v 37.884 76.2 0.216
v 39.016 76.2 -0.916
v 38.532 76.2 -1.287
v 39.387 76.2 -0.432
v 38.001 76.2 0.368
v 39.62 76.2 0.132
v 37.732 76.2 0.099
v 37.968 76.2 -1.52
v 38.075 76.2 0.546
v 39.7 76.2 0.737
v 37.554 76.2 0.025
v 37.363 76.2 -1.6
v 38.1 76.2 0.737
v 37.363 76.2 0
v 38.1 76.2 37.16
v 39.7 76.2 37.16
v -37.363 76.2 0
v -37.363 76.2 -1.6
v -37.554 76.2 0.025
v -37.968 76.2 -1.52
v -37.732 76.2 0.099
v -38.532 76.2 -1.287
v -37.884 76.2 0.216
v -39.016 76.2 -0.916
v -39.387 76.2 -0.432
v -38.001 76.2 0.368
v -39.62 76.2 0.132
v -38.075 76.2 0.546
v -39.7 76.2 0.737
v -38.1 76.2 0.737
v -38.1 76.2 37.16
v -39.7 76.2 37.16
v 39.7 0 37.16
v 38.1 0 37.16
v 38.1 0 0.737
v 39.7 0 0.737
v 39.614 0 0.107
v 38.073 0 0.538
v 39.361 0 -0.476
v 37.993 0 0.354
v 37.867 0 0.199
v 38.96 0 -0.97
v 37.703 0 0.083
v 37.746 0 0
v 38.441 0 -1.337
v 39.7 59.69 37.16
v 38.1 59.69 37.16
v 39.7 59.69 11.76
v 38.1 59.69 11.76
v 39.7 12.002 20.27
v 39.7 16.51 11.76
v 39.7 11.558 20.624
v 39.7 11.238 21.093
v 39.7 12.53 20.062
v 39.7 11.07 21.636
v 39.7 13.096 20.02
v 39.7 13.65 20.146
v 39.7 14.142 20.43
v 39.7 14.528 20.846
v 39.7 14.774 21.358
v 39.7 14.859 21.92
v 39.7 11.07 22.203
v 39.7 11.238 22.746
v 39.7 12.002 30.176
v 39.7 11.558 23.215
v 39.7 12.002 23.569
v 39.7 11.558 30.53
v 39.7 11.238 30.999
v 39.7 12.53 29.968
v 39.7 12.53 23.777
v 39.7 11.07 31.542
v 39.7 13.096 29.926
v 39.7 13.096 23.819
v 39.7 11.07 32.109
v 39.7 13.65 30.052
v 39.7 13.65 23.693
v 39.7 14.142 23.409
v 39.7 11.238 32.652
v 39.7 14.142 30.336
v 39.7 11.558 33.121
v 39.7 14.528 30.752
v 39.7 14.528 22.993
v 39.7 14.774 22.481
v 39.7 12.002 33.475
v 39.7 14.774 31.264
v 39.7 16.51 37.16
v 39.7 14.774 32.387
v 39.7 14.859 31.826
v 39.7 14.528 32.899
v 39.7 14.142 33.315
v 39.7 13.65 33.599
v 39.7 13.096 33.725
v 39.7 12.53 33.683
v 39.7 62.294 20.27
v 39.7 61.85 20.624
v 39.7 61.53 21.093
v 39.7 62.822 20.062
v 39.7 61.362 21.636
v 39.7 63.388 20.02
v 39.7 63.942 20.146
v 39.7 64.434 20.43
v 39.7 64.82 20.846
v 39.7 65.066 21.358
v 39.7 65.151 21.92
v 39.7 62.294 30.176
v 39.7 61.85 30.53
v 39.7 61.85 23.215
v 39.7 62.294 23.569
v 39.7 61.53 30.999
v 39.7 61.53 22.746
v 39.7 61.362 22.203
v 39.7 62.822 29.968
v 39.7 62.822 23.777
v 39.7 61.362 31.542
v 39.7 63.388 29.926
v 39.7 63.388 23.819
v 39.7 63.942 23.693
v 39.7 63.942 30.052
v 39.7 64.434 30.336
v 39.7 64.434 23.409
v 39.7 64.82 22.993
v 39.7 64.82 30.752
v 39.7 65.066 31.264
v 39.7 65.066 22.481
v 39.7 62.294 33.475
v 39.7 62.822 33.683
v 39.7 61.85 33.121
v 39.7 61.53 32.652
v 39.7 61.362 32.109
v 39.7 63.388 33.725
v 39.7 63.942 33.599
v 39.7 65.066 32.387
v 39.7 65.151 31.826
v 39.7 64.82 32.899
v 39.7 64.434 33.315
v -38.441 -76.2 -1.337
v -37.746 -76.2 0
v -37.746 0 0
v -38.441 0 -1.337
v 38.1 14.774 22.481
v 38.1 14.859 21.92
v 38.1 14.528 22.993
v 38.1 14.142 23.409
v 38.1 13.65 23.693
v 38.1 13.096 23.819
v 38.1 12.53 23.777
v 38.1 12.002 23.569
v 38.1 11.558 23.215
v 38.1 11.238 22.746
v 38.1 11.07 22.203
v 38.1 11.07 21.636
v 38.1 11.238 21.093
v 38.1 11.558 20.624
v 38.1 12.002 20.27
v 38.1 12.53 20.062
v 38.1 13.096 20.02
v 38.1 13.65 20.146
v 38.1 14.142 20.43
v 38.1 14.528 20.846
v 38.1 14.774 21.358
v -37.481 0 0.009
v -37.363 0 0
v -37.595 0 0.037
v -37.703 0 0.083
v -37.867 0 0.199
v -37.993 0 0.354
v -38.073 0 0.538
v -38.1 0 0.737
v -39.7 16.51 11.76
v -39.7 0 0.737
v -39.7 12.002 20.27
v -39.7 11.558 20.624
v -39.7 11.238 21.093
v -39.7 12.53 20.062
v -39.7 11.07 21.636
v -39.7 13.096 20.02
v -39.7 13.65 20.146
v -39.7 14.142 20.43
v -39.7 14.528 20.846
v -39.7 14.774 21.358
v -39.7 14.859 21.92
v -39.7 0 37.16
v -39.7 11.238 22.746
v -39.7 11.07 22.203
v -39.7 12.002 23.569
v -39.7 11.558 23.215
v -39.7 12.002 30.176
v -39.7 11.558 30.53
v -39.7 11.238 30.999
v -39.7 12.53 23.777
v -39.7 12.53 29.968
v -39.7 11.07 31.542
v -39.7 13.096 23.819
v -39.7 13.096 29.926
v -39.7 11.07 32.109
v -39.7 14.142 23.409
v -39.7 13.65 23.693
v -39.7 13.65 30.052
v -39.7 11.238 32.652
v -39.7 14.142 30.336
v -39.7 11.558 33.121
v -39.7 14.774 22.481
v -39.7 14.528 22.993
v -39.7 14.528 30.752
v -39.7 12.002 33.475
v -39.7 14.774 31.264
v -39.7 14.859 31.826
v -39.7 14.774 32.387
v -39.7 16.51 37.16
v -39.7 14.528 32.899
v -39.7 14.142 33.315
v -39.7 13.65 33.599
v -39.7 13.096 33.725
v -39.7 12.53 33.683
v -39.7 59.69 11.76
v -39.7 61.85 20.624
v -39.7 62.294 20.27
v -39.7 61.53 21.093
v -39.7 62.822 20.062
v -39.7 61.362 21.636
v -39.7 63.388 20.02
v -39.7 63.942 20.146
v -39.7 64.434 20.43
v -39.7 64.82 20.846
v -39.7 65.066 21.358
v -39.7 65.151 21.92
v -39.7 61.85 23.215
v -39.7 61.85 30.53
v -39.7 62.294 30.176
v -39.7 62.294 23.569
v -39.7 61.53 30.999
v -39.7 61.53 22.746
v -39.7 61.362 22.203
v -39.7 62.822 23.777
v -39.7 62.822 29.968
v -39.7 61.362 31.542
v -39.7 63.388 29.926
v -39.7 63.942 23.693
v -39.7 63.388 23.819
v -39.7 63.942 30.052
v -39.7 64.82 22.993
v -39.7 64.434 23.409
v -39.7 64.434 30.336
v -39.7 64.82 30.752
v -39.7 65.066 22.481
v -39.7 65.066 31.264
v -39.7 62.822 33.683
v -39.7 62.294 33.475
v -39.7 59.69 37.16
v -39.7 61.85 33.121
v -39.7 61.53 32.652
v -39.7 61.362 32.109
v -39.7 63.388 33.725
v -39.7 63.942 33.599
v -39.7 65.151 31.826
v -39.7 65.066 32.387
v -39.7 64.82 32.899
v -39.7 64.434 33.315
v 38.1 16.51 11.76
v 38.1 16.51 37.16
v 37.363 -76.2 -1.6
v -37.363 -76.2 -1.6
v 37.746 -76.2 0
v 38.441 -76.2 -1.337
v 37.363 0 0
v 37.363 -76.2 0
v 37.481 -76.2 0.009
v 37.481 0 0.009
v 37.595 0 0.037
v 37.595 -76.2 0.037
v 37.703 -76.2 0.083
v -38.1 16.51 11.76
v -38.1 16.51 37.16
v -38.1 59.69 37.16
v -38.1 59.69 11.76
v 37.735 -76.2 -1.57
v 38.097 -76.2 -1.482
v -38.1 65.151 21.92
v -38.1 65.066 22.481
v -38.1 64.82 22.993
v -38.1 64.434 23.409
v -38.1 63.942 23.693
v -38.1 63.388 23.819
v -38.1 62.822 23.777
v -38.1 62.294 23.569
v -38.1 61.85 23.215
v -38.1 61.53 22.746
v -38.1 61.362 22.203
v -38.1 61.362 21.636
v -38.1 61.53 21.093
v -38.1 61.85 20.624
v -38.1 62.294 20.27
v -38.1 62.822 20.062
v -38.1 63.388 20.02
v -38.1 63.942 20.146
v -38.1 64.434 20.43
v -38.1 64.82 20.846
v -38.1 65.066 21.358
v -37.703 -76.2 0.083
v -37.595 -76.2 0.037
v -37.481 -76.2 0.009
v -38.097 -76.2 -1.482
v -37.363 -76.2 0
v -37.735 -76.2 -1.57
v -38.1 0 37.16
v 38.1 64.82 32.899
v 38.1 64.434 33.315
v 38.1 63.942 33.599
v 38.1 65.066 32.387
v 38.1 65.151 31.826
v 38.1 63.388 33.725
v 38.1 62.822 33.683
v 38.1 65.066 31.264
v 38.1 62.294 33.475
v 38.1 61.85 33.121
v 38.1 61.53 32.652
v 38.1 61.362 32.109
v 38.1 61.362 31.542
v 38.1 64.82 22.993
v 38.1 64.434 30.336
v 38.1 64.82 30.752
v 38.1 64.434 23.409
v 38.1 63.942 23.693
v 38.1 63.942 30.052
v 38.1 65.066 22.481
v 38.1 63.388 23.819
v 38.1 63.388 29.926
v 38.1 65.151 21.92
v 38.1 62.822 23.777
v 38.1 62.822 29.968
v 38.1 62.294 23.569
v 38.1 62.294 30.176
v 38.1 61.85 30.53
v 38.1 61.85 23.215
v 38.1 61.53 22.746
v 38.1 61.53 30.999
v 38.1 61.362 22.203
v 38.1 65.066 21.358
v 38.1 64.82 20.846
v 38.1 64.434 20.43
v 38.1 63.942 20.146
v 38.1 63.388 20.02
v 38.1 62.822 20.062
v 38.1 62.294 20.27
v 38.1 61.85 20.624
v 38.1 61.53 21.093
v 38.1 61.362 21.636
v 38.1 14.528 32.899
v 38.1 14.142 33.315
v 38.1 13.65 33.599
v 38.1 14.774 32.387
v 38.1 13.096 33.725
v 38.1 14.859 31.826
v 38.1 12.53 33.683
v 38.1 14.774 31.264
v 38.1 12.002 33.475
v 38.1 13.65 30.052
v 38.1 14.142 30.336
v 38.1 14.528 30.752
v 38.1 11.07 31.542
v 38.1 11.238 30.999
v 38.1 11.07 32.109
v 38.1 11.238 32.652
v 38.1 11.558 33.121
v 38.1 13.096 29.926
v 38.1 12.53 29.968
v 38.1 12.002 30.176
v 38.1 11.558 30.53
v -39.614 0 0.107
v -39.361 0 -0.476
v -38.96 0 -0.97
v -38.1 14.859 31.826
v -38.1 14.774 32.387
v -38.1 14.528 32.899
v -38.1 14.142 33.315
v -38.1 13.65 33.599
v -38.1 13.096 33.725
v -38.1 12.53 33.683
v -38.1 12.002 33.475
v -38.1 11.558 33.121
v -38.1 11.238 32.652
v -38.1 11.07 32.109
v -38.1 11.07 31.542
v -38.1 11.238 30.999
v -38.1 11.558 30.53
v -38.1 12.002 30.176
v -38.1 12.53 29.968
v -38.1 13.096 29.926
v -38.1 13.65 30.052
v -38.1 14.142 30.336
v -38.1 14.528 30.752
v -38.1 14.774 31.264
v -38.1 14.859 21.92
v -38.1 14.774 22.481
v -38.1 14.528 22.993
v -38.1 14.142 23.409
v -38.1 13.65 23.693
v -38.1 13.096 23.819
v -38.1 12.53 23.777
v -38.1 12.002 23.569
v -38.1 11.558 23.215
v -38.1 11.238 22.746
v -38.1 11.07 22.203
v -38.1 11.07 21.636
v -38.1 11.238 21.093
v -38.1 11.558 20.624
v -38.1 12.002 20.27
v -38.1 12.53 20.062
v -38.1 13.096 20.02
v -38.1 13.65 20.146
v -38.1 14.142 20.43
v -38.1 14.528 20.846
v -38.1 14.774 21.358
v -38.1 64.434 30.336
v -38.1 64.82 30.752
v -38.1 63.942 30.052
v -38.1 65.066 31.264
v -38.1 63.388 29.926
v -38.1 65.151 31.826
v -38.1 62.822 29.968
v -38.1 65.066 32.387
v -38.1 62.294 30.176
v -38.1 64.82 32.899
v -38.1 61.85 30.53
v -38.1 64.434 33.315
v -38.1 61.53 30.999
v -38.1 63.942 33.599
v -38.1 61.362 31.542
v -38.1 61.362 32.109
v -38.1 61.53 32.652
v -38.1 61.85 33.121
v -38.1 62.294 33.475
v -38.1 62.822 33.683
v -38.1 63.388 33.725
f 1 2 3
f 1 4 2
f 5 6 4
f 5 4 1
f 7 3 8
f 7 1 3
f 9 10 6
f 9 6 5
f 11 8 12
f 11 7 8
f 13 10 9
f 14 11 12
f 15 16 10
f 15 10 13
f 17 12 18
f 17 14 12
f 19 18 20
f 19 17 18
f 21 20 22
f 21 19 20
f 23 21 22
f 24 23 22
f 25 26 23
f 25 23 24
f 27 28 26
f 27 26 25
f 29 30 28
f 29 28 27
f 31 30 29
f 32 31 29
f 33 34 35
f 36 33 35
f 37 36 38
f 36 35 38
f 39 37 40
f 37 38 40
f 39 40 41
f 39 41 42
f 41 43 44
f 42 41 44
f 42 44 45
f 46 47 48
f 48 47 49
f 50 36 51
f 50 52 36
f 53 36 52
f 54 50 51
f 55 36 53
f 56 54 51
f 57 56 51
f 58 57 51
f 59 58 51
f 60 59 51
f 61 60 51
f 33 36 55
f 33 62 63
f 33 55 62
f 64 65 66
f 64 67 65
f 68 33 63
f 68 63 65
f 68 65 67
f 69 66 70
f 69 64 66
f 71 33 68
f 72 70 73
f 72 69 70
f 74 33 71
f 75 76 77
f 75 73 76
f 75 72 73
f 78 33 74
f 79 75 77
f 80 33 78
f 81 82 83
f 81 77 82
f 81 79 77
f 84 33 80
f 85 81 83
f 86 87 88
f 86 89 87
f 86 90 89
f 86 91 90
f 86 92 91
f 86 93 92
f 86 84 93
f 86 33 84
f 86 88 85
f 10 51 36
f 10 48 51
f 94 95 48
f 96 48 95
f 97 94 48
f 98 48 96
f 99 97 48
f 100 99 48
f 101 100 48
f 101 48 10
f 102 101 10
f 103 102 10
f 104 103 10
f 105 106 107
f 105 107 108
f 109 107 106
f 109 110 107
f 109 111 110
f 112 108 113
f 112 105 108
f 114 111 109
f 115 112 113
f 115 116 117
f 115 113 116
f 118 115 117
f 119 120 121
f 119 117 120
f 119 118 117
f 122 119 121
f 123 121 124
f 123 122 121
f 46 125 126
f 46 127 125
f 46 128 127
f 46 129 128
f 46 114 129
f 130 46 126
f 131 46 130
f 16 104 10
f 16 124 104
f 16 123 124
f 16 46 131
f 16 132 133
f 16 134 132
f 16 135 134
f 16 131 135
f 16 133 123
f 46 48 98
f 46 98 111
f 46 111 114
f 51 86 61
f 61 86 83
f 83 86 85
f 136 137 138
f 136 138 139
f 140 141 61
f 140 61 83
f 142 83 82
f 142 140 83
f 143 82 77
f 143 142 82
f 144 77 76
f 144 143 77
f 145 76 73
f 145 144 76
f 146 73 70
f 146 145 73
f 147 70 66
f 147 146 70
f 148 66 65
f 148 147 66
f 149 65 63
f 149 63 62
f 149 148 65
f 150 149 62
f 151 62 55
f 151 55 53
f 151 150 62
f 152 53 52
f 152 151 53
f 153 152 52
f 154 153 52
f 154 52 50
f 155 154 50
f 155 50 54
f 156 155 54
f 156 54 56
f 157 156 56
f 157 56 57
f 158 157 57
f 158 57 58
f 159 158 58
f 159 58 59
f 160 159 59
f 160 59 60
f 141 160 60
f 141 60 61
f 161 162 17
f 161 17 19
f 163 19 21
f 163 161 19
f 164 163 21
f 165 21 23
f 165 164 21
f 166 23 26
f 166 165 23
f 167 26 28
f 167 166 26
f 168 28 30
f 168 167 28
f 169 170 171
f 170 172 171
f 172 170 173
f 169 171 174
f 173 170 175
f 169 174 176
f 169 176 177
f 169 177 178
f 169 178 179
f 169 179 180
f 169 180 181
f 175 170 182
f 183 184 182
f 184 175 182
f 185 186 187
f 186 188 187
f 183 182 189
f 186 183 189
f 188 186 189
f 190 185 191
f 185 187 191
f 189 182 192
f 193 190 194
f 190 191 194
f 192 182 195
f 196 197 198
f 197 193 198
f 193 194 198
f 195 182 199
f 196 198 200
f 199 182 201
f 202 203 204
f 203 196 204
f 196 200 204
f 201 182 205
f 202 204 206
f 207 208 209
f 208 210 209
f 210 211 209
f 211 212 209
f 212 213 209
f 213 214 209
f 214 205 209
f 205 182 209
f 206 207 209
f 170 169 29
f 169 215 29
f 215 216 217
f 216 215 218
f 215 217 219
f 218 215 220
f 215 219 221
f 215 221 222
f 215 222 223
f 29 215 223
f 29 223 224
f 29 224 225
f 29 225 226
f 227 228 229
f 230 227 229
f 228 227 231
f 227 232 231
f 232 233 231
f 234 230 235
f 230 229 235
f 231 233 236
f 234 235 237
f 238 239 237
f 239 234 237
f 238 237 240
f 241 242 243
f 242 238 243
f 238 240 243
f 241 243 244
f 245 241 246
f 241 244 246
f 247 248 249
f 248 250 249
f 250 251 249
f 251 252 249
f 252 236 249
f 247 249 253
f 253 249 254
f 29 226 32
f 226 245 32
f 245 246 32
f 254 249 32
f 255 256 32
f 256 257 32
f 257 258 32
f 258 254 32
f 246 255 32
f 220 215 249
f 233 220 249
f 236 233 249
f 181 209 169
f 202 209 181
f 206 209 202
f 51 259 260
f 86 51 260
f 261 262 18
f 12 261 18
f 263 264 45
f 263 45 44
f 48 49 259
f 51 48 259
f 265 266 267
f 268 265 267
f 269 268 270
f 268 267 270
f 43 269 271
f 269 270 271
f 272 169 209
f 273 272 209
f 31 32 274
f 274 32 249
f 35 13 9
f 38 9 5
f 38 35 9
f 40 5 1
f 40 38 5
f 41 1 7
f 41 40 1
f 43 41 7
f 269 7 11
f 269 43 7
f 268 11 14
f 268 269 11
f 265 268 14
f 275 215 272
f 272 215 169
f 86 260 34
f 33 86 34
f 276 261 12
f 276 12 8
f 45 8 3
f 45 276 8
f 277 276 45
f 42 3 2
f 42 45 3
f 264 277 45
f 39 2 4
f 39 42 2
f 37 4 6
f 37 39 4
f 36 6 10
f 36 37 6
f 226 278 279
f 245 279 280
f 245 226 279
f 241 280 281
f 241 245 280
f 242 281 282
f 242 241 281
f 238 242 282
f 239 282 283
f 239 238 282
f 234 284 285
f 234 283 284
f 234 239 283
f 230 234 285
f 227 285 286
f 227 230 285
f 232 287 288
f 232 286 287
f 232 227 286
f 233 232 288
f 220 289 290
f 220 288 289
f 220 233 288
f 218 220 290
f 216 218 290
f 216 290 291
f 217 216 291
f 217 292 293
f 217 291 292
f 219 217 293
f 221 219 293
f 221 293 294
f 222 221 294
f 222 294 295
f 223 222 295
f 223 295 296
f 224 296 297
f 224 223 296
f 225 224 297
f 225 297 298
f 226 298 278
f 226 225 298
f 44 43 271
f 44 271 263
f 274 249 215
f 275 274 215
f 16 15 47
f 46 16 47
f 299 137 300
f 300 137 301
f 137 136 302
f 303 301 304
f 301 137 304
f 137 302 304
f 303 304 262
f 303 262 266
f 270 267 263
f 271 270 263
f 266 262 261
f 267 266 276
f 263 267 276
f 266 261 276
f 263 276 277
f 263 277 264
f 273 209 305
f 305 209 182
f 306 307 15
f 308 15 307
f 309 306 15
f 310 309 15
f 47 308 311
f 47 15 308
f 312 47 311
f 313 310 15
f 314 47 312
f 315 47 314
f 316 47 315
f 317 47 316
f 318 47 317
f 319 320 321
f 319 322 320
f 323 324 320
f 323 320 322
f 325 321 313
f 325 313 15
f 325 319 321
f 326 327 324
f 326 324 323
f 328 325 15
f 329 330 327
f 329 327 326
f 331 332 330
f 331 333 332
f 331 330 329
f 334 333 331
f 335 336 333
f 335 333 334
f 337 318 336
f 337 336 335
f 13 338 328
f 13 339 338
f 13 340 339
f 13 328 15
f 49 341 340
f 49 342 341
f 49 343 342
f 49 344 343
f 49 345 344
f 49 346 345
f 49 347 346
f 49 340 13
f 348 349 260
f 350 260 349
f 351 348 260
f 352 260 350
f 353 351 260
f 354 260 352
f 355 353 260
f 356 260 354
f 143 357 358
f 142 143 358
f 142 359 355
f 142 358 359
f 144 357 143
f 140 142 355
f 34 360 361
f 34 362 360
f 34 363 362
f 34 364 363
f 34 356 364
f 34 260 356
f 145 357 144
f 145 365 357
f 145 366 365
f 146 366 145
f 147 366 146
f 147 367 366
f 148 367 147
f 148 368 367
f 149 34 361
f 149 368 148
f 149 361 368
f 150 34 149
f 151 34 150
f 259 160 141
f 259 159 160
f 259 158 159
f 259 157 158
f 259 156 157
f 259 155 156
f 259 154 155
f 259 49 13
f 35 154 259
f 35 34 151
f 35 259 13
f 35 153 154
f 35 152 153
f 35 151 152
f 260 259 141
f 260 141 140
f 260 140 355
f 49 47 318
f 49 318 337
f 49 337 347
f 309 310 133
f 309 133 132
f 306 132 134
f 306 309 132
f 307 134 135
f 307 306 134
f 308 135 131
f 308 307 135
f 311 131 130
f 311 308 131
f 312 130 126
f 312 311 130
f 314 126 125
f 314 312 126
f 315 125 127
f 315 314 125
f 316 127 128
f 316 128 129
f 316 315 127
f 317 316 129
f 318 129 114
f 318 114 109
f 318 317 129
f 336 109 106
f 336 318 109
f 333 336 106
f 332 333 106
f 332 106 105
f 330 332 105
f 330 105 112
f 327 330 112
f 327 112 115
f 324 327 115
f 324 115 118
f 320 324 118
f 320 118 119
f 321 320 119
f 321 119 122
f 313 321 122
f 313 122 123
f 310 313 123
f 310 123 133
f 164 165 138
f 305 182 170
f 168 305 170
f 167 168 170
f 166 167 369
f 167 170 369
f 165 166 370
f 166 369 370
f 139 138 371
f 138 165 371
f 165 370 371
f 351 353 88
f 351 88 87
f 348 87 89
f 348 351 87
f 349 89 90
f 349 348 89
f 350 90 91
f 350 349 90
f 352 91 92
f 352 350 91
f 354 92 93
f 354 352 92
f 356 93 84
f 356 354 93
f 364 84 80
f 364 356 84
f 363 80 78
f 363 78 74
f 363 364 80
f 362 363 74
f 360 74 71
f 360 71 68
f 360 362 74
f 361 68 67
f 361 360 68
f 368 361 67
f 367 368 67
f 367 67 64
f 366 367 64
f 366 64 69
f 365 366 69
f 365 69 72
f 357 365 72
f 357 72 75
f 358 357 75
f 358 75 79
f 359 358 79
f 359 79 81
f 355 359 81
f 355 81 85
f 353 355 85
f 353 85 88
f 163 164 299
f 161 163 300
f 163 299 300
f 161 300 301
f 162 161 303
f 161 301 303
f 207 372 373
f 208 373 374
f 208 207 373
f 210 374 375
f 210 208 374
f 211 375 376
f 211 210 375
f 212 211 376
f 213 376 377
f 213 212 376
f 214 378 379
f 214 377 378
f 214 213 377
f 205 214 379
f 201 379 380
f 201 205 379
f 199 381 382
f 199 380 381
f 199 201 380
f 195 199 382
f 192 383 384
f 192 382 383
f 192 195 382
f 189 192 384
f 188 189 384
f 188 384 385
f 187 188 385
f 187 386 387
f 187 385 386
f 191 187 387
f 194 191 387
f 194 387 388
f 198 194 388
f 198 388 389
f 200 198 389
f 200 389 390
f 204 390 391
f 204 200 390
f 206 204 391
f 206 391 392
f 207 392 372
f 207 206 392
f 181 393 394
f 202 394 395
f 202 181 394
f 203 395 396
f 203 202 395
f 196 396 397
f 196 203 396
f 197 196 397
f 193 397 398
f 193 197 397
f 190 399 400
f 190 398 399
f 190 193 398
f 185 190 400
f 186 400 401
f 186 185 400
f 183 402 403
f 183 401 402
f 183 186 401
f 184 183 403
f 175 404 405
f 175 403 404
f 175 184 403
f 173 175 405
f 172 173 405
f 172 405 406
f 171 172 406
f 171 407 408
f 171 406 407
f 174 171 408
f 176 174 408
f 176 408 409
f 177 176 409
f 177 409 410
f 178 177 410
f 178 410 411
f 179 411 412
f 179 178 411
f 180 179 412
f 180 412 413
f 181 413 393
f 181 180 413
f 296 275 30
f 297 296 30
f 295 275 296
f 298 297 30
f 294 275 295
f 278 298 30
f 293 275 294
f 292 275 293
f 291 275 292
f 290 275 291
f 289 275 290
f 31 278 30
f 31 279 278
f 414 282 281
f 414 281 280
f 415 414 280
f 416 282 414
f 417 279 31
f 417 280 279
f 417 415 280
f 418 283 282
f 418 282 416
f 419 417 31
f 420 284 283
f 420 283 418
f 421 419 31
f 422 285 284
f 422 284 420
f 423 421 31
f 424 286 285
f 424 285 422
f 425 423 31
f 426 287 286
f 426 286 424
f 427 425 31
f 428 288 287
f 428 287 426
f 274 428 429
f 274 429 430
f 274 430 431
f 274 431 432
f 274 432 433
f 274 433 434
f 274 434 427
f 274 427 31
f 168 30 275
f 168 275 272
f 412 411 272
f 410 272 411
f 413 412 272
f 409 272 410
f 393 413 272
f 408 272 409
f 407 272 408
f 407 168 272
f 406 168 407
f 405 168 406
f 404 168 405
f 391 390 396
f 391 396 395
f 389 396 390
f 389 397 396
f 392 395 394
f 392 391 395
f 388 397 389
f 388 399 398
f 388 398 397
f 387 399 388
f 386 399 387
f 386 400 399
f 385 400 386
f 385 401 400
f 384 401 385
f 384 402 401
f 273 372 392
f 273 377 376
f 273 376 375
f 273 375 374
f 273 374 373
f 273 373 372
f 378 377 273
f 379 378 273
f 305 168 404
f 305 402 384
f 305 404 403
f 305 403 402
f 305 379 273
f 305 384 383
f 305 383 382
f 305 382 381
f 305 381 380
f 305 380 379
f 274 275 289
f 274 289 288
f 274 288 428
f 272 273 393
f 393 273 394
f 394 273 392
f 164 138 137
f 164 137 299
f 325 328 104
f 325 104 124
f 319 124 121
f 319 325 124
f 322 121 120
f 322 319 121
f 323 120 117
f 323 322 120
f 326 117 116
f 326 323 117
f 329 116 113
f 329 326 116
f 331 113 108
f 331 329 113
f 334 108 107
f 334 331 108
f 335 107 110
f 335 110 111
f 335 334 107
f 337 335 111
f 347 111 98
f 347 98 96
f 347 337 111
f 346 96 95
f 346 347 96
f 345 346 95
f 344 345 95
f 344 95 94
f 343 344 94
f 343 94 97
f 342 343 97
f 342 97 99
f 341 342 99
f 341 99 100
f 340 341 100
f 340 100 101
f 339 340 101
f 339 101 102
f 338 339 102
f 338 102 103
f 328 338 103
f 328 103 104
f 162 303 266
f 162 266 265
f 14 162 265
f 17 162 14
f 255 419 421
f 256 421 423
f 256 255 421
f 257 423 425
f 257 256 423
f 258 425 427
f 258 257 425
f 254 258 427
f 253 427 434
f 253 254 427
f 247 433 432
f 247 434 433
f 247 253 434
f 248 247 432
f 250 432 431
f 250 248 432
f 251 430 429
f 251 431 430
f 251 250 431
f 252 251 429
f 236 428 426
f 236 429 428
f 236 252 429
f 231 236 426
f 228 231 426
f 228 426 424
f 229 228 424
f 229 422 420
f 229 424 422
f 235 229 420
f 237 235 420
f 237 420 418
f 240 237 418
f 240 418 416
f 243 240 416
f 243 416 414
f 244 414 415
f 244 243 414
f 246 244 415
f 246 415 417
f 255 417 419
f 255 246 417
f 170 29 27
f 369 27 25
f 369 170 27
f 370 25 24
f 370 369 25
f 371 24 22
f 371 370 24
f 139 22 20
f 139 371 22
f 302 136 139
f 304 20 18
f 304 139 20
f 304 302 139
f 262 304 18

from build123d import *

# Parameters (mm, degrees)
SKETCH1_R                  = 1.905
BASE_FLANGE1_DEPTH         = 1.6
SKETCHED_START             = -76.2
SKETCHED_BEND1_OUTLINE_W   = 76.2
SKETCHED_BEND1_OUTLINE_H   = 1.6
SKETCHED_BEND1_DEPTH       = 36.5
SKETCHED_START_2           = 39.7
SKETCHED_BEND1_2_OUTLINE_W = 76.2
SKETCHED_BEND1_2_OUTLINE_H = 1.6
SKETCHED_BEND1_2_DEPTH     = 36.5
SKETCHED_START_3           = -39.7
SKETCHED_BEND1_3_OUTLINE_R = 1.905
SKETCHED_BEND1_3_DEPTH     = 2.3366
SKETCHED_START_4           = 37.3634
SKETCHED_BEND1_4_OUTLINE_R = 1.905
SKETCHED_BEND1_4_DEPTH     = 2.3366
SKETCHED_START_5           = -38.441087378
SKETCHED_BEND1_5_OUTLINE_W = 76.2
SKETCHED_BEND1_5_OUTLINE_H = 1.6
SKETCHED_BEND1_5_DEPTH     = 0.341087378
SKETCHED_START_6           = 38.1
SKETCHED_BEND1_6_OUTLINE_W = 76.2
SKETCHED_BEND1_6_OUTLINE_H = 1.6
SKETCHED_BEND1_6_DEPTH     = 0.341087378
SKETCHED_START_7           = -77
SKETCHED_BEND1_7_DEPTH     = 154
SKETCHED_BEND1_8_DEPTH     = 77
SKETCHED_BEND1_9_DEPTH     = 76.2


with BuildPart() as part:
    # Base-Flange1: sheet metal written as solids
    # Sketch1 → Base-Flange1 (new body)
    with BuildSketch(Plane.XY):
        Polygon((-76.2, 59.69), (-50.8, 59.69), (-50.8, 16.51), (-76.2, 16.51), (-76.2, 0), (-38.1, 0), (-38.1, -76.2), (38.1, -76.2), (38.1, 0), (76.2, 0), (76.2, 16.51), (50.8, 16.51), (50.8, 59.69), (76.2, 59.69), (76.2, 76.2), (-76.2, 76.2), align=None)
        with Locations((-60.96, 63.246)):
            Circle(SKETCH1_R, mode=Mode.SUBTRACT)
        with Locations((-70.866, 63.246)):
            Circle(SKETCH1_R, mode=Mode.SUBTRACT)
        with Locations(Location((-70.866, 12.954, 0), (0, 0, 180))):
            Circle(SKETCH1_R, mode=Mode.SUBTRACT)
        with Locations(Location((-60.96, 12.954, 0), (0, 0, 180))):
            Circle(SKETCH1_R, mode=Mode.SUBTRACT)
        with Locations((60.96, 12.954)):
            Circle(SKETCH1_R, mode=Mode.SUBTRACT)
        with Locations((70.866, 12.954)):
            Circle(SKETCH1_R, mode=Mode.SUBTRACT)
        with Locations(Location((70.866, 63.246, 0), (0, 0, 180))):
            Circle(SKETCH1_R, mode=Mode.SUBTRACT)
        with Locations(Location((60.96, 63.246, 0), (0, 0, 180))):
            Circle(SKETCH1_R, mode=Mode.SUBTRACT)
    extrude(amount=-BASE_FLANGE1_DEPTH)

    # Sketched Bend1: read off the stored shape, not the designer's step
    # Sketched Bend1 outline → Sketched Bend1 (cut)
    with BuildSketch(Plane.YZ.offset(SKETCHED_START)):
        with Locations((38.1, -0.8)):
            Rectangle(SKETCHED_BEND1_OUTLINE_W, SKETCHED_BEND1_OUTLINE_H)
    extrude(amount=SKETCHED_BEND1_DEPTH, mode=Mode.SUBTRACT)

    # Sketched Bend1 2 outline → Sketched Bend1 2 (cut)
    with BuildSketch(Plane.YZ.offset(SKETCHED_START_2)):
        with Locations((38.1, -0.8)):
            Rectangle(SKETCHED_BEND1_2_OUTLINE_W, SKETCHED_BEND1_2_OUTLINE_H)
    extrude(amount=SKETCHED_BEND1_2_DEPTH, mode=Mode.SUBTRACT)

    # Sketched Bend1 3 outline → Sketched Bend1 3 (add)
    with BuildSketch(Plane.YZ.offset(SKETCHED_START_3)):
        Polygon((0, 0), (76.2, 0), (76.2, 37.159514364), (59.69, 37.159514364), (59.69, 11.759514364), (16.51, 11.759514364), (16.51, 37.159514364), (0, 37.159514364), align=None)
        with Locations((12.954, 21.919514364)):
            Circle(SKETCHED_BEND1_3_OUTLINE_R, mode=Mode.SUBTRACT)
        with Locations((63.246, 21.919514364)):
            Circle(SKETCHED_BEND1_3_OUTLINE_R, mode=Mode.SUBTRACT)
        with Locations((12.954, 31.825514364)):
            Circle(SKETCHED_BEND1_3_OUTLINE_R, mode=Mode.SUBTRACT)
        with Locations((63.246, 31.825514364)):
            Circle(SKETCHED_BEND1_3_OUTLINE_R, mode=Mode.SUBTRACT)
    extrude(amount=SKETCHED_BEND1_3_DEPTH)

    # Sketched Bend1 4 outline → Sketched Bend1 4 (add)
    with BuildSketch(Plane.YZ.offset(SKETCHED_START_4)):
        Polygon((0, 0), (76.2, 0), (76.2, 37.159514364), (59.69, 37.159514364), (59.69, 11.759514364), (16.51, 11.759514364), (16.51, 37.159514364), (0, 37.159514364), align=None)
        with Locations((12.954, 21.919514364)):
            Circle(SKETCHED_BEND1_4_OUTLINE_R, mode=Mode.SUBTRACT)
        with Locations((63.246, 21.919514364)):
            Circle(SKETCHED_BEND1_4_OUTLINE_R, mode=Mode.SUBTRACT)
        with Locations((12.954, 31.825514364)):
            Circle(SKETCHED_BEND1_4_OUTLINE_R, mode=Mode.SUBTRACT)
        with Locations((63.246, 31.825514364)):
            Circle(SKETCHED_BEND1_4_OUTLINE_R, mode=Mode.SUBTRACT)
    extrude(amount=SKETCHED_BEND1_4_DEPTH)

    # Sketched Bend1 5 outline → Sketched Bend1 5 (add)
    with BuildSketch(Plane.YZ.offset(SKETCHED_START_5)):
        with Locations((-38.1, -0.8)):
            Rectangle(SKETCHED_BEND1_5_OUTLINE_W, SKETCHED_BEND1_5_OUTLINE_H)
    extrude(amount=SKETCHED_BEND1_5_DEPTH)

    # Sketched Bend1 6 outline → Sketched Bend1 6 (add)
    with BuildSketch(Plane.YZ.offset(SKETCHED_START_6)):
        with Locations((-38.1, -0.8)):
            Rectangle(SKETCHED_BEND1_6_OUTLINE_W, SKETCHED_BEND1_6_OUTLINE_H)
    extrude(amount=SKETCHED_BEND1_6_DEPTH)

    # Sketched Bend1 7 outline → Sketched Bend1 7 (cut)
    with BuildSketch(Plane(origin=(0, 0, 0), x_dir=(1, 0, 0), z_dir=(0, 1, 0)).offset(SKETCHED_START_7)):
        with BuildLine():
            Line((-37.3634, 1.6), (-39.7, 1.6))
            Line((-39.7, 1.6), (-39.7, -0.7366))
            ThreePointArc((-39.7, -0.7366), (-39.015625705, 0.915625705), (-37.3634, 1.6))
        make_face()
        with BuildLine():
            ThreePointArc((-37.3634, 0), (-37.884254855, -0.215745145), (-38.1, -0.7366))
            Line((-38.1, -0.7366), (-38.1, -37.159514364))
            Line((-38.1, -37.159514364), (-37.3634, -37.159514364))
            Line((-37.3634, -37.159514364), (-37.3634, 0))
        make_face()
        with BuildLine():
            ThreePointArc((37.3634, 1.6), (39.015625705, 0.915625705), (39.7, -0.7366))
            Line((39.7, -0.7366), (39.7, 1.6))
            Line((39.7, 1.6), (37.3634, 1.6))
        make_face()
        with BuildLine():
            Line((37.3634, 0), (37.3634, -37.159514364))
            Line((37.3634, -37.159514364), (38.1, -37.159514364))
            Line((38.1, -37.159514364), (38.1, -0.7366))
            ThreePointArc((38.1, -0.7366), (37.884254855, -0.215745145), (37.3634, 0))
        make_face()
    extrude(amount=SKETCHED_BEND1_7_DEPTH, mode=Mode.SUBTRACT)

    # Sketched Bend1 8 outline → Sketched Bend1 8 (cut)
    with BuildSketch(Plane(origin=(0, 0, 0), x_dir=(1, 0, 0), z_dir=(0, 1, 0)).offset(SKETCHED_START_7)):
        Polygon((-37.746292342, 0), (-38.441087378, 1.33663165), (-38.441087378, 0), align=None)
        Polygon((38.441087378, 0), (38.441087378, 1.33663165), (37.746292342, 0), align=None)
    extrude(amount=SKETCHED_BEND1_8_DEPTH, mode=Mode.SUBTRACT)

    # Sketched Bend1 9 outline → Sketched Bend1 9 (add)
    with BuildSketch(Plane(origin=(0, 0, 0), x_dir=(1, 0, 0), z_dir=(0, 1, 0)).offset(SKETCHED_START)):
        with BuildLine():
            Line((-37.3634, 0), (-37.746292342, 0))
            Line((-37.746292342, 0), (-37.703134881, -0.08302539))
            ThreePointArc((-37.703134881, -0.08302539), (-37.538266381, -0.021057333), (-37.3634, 0))
        make_face()
        with BuildLine():
            Line((37.746292342, 0), (37.3634, 0))
            ThreePointArc((37.3634, 0), (37.538266381, -0.021057333), (37.703134881, -0.08302539))
            Line((37.703134881, -0.08302539), (37.746292342, 0))
        make_face()
    extrude(amount=SKETCHED_BEND1_9_DEPTH)


solid = part.part
